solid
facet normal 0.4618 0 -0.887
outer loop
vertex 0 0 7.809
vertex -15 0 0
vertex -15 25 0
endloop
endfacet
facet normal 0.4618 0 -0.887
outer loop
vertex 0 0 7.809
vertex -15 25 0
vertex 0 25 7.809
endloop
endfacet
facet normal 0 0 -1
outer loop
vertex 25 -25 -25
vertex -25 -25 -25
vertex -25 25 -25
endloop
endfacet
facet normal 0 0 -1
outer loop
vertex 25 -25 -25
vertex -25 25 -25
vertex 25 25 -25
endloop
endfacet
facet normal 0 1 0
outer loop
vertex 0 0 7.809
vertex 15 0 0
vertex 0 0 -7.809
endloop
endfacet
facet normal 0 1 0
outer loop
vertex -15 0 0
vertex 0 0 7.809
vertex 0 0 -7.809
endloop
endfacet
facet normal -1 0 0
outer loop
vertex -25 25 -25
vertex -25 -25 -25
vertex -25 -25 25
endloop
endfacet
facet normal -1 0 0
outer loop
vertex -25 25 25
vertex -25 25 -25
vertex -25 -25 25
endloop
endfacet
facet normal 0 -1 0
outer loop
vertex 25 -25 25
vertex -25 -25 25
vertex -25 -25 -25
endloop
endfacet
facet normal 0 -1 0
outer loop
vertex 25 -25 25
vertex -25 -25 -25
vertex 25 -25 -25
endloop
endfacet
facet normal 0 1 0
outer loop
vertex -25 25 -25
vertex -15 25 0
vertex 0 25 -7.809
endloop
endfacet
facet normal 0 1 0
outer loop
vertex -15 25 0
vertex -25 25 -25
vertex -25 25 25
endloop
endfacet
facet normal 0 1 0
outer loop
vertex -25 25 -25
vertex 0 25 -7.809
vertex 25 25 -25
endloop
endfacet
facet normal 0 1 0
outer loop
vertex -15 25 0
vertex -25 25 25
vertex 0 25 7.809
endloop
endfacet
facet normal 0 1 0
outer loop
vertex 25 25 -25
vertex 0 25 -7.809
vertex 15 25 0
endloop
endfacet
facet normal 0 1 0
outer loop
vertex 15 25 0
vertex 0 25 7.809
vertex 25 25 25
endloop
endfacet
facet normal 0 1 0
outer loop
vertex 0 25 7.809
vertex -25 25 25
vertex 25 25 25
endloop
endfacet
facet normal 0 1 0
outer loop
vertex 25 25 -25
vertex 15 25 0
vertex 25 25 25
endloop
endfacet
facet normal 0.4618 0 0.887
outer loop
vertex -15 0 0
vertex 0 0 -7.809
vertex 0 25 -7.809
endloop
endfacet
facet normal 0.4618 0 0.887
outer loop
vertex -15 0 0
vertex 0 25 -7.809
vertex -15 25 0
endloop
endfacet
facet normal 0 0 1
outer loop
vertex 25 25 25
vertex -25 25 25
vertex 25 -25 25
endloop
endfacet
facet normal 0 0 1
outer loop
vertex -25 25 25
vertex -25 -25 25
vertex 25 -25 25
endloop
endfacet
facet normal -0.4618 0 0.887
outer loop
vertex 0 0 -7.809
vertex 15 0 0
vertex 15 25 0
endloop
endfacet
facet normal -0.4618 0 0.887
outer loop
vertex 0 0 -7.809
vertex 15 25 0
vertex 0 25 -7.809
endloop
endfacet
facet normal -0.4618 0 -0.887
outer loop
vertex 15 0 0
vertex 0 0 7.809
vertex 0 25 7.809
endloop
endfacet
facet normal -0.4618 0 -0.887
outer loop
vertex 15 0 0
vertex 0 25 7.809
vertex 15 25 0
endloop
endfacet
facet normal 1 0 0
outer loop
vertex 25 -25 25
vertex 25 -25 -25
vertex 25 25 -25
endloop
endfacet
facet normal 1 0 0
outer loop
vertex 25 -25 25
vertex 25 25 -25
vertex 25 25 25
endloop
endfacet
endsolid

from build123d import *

# Parameters (mm, degrees)
F0_W     = 50
F0_H     = 50
F1_DEPTH = 25
F3_DEPTH = 25


with BuildPart() as f1:
    # F0 (on Front) → F1 (new body, symmetric)
    with BuildSketch(Plane.XZ):
        Rectangle(F0_W, F0_H)
    extrude(amount=F1_DEPTH, both=True)

    # F2 (on face) → F3 (cut)
    with BuildSketch(Plane(origin=(0, 25, 0), x_dir=(-1, 0, 0), z_dir=(0, 1, 0))):
        Polygon((15, 0), (0, 7.808506), (-15, 0), (0, -7.808506), align=None)
    extrude(amount=-F3_DEPTH, mode=Mode.SUBTRACT)


solid = f1.part
